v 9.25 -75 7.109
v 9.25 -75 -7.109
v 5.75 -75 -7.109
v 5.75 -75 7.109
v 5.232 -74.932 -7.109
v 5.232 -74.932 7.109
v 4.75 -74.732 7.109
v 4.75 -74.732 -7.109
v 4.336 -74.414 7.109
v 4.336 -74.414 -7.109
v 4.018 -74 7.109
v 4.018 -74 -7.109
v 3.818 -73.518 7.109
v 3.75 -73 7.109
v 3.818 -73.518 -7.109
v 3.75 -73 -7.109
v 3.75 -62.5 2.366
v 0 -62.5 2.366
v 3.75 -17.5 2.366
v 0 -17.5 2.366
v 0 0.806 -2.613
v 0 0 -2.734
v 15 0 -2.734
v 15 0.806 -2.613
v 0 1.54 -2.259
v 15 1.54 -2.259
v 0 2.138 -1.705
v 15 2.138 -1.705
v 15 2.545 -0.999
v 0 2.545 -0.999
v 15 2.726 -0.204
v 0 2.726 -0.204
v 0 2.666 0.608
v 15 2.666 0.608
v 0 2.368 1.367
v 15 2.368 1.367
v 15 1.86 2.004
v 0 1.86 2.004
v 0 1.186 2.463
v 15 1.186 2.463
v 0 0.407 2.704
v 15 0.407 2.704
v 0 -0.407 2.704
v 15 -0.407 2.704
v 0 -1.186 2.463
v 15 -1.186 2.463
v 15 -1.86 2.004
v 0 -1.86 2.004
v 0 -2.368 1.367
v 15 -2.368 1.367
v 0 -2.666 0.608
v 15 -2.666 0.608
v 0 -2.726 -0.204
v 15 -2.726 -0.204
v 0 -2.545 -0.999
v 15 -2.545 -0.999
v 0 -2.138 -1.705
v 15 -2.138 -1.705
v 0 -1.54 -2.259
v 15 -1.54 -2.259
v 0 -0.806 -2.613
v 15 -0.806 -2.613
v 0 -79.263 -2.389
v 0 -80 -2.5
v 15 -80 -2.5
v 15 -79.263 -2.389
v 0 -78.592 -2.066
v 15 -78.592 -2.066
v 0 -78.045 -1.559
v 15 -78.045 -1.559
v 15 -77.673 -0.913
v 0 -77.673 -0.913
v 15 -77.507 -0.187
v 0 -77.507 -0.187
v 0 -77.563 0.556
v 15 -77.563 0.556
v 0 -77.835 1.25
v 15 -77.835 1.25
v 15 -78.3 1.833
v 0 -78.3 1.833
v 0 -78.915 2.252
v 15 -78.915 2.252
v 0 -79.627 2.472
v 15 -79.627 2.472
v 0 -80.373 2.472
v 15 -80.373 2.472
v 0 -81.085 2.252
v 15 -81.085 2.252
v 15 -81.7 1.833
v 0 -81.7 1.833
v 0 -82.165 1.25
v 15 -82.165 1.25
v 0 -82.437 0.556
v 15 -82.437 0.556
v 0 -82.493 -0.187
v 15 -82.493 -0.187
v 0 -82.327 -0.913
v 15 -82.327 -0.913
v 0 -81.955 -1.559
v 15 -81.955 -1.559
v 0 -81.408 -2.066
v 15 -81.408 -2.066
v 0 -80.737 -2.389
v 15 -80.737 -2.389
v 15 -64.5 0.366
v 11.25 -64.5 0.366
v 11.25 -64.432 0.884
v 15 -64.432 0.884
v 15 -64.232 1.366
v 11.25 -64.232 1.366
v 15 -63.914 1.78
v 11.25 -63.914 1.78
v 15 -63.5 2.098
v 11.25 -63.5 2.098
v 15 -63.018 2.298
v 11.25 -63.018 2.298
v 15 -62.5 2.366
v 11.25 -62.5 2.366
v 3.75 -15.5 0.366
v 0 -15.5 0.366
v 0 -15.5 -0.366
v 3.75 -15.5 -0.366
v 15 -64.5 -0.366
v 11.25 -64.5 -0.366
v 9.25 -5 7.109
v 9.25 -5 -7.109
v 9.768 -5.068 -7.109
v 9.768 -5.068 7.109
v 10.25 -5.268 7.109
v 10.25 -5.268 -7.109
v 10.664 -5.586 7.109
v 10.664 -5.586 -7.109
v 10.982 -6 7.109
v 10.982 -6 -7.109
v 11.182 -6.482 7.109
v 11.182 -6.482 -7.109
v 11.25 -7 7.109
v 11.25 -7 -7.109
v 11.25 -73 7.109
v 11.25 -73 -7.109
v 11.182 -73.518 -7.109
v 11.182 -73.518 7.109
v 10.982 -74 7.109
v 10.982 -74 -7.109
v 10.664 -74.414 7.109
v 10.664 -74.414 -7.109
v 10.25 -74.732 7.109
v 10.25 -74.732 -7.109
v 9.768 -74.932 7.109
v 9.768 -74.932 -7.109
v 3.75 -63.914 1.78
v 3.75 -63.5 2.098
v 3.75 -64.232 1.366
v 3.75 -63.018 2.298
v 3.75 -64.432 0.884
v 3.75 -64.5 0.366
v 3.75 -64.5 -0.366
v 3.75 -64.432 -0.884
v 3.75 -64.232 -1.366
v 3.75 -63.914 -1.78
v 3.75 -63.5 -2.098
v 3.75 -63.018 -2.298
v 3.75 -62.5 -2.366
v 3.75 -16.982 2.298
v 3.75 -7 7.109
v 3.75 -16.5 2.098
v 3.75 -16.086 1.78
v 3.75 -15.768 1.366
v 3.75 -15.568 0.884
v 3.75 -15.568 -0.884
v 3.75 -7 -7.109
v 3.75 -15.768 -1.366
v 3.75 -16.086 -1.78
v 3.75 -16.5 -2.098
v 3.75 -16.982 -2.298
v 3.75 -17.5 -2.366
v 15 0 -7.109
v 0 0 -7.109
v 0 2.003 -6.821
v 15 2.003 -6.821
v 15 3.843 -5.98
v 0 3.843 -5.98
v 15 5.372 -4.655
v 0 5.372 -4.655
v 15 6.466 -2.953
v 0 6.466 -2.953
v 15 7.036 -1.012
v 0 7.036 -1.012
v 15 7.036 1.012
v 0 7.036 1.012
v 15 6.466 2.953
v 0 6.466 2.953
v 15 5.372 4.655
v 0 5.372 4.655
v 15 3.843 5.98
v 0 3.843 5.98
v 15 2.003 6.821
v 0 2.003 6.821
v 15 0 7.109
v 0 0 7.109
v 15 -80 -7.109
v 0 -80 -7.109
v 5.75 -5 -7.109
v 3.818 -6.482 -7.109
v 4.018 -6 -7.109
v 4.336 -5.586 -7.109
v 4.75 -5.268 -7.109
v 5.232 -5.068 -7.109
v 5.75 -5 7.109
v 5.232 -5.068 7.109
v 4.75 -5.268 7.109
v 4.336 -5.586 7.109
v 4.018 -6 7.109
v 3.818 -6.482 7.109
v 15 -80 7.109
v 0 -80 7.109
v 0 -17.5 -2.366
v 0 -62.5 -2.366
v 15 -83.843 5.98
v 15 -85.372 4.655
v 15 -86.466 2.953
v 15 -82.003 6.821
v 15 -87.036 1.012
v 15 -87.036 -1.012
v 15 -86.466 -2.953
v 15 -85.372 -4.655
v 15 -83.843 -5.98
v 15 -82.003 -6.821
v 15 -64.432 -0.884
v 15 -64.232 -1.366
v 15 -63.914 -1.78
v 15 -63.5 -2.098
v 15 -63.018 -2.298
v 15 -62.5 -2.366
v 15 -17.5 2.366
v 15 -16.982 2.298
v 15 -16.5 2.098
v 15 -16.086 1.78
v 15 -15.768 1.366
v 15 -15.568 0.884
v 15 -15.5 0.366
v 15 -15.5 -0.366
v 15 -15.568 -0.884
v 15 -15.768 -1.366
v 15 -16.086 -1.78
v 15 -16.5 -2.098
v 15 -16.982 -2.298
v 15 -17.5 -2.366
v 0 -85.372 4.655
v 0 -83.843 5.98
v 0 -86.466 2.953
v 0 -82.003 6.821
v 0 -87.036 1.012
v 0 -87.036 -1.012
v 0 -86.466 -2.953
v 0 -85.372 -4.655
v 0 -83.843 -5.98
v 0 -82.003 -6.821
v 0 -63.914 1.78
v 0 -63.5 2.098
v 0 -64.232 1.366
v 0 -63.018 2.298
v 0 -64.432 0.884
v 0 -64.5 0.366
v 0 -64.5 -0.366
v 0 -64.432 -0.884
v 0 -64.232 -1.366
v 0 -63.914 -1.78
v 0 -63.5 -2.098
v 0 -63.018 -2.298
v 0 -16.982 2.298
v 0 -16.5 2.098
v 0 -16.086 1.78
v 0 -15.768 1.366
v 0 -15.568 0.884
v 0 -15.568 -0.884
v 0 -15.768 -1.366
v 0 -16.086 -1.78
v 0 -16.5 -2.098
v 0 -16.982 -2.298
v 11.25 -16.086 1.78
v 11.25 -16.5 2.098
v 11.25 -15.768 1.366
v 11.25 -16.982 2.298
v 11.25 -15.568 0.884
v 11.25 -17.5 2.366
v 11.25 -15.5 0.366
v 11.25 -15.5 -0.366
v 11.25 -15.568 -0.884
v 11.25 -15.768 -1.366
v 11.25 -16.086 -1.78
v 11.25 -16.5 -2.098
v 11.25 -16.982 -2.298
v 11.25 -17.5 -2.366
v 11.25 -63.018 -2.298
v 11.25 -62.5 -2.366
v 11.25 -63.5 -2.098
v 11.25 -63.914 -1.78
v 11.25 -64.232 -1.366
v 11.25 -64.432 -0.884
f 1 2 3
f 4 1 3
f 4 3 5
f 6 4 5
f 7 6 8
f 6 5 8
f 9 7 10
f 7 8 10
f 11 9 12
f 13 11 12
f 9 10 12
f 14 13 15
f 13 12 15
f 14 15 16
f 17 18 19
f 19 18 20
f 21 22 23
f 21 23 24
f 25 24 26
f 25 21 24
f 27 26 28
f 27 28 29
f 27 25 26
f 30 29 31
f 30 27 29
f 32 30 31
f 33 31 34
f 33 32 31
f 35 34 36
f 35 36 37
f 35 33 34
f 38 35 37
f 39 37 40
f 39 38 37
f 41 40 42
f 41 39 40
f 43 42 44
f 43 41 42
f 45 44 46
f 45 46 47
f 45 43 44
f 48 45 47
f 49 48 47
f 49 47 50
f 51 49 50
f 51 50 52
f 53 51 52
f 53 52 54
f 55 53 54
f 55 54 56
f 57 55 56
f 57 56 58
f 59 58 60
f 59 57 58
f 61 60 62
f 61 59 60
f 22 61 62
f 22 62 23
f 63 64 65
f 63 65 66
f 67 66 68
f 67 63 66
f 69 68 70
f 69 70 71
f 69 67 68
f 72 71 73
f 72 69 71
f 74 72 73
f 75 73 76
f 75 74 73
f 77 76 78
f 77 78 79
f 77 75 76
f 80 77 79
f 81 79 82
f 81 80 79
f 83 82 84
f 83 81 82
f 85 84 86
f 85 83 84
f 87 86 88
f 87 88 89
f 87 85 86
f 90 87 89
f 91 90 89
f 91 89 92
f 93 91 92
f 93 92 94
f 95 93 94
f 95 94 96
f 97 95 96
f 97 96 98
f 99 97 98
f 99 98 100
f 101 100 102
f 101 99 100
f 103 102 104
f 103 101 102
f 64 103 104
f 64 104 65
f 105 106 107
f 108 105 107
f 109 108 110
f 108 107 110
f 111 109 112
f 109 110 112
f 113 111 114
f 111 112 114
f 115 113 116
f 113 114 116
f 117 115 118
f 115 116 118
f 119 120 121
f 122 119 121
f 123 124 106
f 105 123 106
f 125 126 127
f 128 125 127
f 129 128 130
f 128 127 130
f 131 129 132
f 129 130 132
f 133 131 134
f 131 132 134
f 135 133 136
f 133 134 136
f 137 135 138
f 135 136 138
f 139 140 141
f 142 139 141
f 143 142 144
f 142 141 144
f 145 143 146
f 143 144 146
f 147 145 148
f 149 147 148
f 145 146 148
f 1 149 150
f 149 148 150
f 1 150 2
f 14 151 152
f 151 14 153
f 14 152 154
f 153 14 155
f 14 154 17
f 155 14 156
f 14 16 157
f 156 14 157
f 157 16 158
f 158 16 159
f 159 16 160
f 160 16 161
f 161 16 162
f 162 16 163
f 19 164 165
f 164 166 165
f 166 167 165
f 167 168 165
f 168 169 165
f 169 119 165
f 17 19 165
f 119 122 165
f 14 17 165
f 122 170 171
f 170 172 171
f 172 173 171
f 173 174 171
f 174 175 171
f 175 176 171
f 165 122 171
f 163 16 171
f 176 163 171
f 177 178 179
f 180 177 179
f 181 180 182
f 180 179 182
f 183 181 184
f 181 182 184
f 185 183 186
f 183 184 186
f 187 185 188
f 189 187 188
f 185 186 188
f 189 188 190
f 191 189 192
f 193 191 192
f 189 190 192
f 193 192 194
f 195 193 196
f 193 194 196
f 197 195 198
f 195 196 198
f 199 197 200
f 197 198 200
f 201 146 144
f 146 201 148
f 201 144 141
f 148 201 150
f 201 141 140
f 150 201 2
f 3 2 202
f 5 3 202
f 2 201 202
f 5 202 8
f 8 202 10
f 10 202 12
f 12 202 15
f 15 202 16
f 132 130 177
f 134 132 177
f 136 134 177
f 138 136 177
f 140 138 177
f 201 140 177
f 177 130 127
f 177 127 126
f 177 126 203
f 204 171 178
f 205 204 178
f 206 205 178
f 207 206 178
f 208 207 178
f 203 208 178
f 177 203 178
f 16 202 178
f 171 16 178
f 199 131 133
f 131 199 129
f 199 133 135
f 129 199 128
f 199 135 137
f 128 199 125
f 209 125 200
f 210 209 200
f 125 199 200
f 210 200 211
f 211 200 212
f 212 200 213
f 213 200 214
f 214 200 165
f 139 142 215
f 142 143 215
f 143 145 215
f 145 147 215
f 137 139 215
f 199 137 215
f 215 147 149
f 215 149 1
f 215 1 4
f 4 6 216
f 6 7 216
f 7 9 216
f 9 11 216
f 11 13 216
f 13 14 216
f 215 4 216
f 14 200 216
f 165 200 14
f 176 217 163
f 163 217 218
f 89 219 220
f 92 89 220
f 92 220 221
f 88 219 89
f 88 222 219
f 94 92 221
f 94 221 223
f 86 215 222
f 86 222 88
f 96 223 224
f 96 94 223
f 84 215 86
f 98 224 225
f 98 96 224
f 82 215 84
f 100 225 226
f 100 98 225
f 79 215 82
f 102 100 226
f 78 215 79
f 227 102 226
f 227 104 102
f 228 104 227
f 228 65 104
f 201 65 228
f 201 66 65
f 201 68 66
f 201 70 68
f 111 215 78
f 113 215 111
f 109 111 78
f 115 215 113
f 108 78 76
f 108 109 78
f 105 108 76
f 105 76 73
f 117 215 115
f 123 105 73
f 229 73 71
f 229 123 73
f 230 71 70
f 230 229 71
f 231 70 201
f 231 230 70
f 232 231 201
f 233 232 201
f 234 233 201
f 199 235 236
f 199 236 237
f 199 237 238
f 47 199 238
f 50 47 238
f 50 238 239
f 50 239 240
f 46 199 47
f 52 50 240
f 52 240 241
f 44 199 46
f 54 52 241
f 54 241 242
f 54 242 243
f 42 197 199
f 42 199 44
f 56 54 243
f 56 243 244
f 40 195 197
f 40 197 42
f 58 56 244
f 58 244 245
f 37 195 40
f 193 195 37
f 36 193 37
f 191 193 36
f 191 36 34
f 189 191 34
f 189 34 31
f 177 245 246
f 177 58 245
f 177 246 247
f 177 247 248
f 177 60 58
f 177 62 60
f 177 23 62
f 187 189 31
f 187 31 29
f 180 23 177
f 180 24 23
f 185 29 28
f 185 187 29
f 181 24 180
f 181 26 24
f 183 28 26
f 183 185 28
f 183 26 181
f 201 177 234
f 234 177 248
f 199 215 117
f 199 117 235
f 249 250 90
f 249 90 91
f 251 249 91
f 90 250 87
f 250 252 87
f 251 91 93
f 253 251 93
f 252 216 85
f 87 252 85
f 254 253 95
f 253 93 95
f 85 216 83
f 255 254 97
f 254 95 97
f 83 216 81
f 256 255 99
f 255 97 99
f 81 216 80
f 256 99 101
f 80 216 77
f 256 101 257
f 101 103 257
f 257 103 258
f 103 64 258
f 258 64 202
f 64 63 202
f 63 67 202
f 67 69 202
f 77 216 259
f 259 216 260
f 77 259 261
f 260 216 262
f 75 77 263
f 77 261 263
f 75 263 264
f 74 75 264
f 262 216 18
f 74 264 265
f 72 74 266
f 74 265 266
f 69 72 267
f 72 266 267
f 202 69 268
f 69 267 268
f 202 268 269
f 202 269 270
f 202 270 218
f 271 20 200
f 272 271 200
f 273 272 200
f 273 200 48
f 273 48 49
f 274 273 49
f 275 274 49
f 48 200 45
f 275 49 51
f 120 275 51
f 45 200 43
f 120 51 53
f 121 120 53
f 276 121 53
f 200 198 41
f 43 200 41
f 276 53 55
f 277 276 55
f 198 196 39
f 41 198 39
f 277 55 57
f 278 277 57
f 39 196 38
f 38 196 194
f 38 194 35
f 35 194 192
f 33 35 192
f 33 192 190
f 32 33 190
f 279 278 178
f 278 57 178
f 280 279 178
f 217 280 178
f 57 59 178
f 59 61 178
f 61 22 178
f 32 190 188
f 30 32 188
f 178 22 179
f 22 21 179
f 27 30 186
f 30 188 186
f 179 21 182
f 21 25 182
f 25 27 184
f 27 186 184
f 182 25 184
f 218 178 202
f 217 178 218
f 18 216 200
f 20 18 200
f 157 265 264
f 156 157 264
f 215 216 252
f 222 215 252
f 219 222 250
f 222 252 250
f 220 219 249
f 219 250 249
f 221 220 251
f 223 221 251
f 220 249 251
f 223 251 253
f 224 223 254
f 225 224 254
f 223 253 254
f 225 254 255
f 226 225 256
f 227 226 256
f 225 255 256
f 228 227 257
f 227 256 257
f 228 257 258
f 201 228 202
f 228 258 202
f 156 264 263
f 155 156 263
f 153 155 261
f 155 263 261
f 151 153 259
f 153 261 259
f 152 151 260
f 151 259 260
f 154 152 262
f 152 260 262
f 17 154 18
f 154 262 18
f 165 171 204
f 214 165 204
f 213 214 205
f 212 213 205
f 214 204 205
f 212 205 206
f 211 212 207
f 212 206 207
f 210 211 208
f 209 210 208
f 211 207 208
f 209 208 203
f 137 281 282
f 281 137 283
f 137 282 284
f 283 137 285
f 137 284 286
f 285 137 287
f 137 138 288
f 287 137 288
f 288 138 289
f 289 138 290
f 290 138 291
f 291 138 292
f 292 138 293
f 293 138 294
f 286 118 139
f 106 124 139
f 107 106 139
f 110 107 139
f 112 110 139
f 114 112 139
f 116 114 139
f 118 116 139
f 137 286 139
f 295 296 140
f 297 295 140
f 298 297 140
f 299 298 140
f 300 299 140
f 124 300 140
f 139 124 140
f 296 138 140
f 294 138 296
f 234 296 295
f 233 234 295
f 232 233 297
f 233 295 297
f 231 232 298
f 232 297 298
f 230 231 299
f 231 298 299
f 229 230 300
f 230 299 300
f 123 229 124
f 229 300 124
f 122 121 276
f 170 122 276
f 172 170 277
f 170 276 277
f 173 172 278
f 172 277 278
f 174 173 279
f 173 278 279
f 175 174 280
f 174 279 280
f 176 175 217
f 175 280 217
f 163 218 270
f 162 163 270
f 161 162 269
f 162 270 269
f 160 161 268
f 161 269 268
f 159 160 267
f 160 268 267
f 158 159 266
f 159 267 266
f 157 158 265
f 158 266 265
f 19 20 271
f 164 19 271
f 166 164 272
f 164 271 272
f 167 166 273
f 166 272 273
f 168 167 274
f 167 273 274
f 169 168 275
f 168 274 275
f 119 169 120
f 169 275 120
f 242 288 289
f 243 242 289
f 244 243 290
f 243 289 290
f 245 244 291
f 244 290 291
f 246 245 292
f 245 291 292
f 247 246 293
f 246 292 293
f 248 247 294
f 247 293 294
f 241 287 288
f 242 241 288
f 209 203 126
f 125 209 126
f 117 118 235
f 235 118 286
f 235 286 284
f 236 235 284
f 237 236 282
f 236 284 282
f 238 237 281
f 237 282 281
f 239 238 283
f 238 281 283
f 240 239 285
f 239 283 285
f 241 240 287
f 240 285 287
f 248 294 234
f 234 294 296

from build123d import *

# Parameters (mm, degrees)
SKETCH2_R           = 2.5
SKETCH2_R_2         = 2.734092972
BOSS_EXTRUDE1_DEPTH = 15
CUT_EXTRUDE1_DEPTH  = 30


with BuildPart() as part:
    # Sketch2 → Boss-Extrude1 (new body)
    with BuildSketch(Plane(origin=(0, 0, 0), x_dir=(0, 0, -1), z_dir=(1, 0, 0))):
        with BuildLine():
            Line((7.108641727, -80), (7.108641727, 0))
            ThreePointArc((7.108641727, 0), (0, 7.108641727), (-7.108641727, 0))
            Line((-7.108641727, 0), (-7.108641727, -80))
            ThreePointArc((-7.108641727, -80), (0, -87.108641727), (7.108641727, -80))
        make_face()
        with Locations((0, -80)):
            Circle(SKETCH2_R, mode=Mode.SUBTRACT)
        with BuildLine():
            Line((-0.366207439, -15.5), (0, -15.5))
            Line((0, -15.5), (0.366207439, -15.5))
            ThreePointArc((0.366207439, -15.5), (1.780421002, -16.085786438), (2.366207439, -17.5))
            Line((2.366207439, -17.5), (2.366207439, -62.5))
            ThreePointArc((2.366207439, -62.5), (1.780421002, -63.914213562), (0.366207439, -64.5))
            Line((0.366207439, -64.5), (-0.366207439, -64.5))
            ThreePointArc((-0.366207439, -64.5), (-1.780421002, -63.914213562), (-2.366207439, -62.5))
            Line((-2.366207439, -62.5), (-2.366207439, -17.5))
            ThreePointArc((-2.366207439, -17.5), (-1.780421002, -16.085786438), (-0.366207439, -15.5))
        make_face(mode=Mode.SUBTRACT)
        Circle(SKETCH2_R_2, mode=Mode.SUBTRACT)
    extrude(amount=BOSS_EXTRUDE1_DEPTH)

    # Sketch3 → Cut-Extrude1 (cut)
    with BuildSketch(Plane(origin=(0, 0, -7.108641727), x_dir=(-1, 0, 0), z_dir=(0, 0, -1))):
        with BuildLine():
            Line((-5.75, -5), (-7.5, -5))
            Line((-7.5, -5), (-7.5, -75))
            Line((-7.5, -75), (-5.75, -75))
            ThreePointArc((-5.75, -75), (-4.335786438, -74.414213562), (-3.75, -73))
            Line((-3.75, -73), (-3.75, -7))
            ThreePointArc((-3.75, -7), (-4.335786438, -5.585786438), (-5.75, -5))
        make_face()
        with BuildLine():
            Line((-7.5, -75), (-7.5, -5))
            Line((-7.5, -5), (-9.25, -5))
            ThreePointArc((-9.25, -5), (-10.664213562, -5.585786438), (-11.25, -7))
            Line((-11.25, -7), (-11.25, -73))
            ThreePointArc((-11.25, -73), (-10.664213562, -74.414213562), (-9.25, -75))
            Line((-9.25, -75), (-7.5, -75))
        make_face()
    extrude(amount=-CUT_EXTRUDE1_DEPTH, mode=Mode.SUBTRACT)


solid = part.part
